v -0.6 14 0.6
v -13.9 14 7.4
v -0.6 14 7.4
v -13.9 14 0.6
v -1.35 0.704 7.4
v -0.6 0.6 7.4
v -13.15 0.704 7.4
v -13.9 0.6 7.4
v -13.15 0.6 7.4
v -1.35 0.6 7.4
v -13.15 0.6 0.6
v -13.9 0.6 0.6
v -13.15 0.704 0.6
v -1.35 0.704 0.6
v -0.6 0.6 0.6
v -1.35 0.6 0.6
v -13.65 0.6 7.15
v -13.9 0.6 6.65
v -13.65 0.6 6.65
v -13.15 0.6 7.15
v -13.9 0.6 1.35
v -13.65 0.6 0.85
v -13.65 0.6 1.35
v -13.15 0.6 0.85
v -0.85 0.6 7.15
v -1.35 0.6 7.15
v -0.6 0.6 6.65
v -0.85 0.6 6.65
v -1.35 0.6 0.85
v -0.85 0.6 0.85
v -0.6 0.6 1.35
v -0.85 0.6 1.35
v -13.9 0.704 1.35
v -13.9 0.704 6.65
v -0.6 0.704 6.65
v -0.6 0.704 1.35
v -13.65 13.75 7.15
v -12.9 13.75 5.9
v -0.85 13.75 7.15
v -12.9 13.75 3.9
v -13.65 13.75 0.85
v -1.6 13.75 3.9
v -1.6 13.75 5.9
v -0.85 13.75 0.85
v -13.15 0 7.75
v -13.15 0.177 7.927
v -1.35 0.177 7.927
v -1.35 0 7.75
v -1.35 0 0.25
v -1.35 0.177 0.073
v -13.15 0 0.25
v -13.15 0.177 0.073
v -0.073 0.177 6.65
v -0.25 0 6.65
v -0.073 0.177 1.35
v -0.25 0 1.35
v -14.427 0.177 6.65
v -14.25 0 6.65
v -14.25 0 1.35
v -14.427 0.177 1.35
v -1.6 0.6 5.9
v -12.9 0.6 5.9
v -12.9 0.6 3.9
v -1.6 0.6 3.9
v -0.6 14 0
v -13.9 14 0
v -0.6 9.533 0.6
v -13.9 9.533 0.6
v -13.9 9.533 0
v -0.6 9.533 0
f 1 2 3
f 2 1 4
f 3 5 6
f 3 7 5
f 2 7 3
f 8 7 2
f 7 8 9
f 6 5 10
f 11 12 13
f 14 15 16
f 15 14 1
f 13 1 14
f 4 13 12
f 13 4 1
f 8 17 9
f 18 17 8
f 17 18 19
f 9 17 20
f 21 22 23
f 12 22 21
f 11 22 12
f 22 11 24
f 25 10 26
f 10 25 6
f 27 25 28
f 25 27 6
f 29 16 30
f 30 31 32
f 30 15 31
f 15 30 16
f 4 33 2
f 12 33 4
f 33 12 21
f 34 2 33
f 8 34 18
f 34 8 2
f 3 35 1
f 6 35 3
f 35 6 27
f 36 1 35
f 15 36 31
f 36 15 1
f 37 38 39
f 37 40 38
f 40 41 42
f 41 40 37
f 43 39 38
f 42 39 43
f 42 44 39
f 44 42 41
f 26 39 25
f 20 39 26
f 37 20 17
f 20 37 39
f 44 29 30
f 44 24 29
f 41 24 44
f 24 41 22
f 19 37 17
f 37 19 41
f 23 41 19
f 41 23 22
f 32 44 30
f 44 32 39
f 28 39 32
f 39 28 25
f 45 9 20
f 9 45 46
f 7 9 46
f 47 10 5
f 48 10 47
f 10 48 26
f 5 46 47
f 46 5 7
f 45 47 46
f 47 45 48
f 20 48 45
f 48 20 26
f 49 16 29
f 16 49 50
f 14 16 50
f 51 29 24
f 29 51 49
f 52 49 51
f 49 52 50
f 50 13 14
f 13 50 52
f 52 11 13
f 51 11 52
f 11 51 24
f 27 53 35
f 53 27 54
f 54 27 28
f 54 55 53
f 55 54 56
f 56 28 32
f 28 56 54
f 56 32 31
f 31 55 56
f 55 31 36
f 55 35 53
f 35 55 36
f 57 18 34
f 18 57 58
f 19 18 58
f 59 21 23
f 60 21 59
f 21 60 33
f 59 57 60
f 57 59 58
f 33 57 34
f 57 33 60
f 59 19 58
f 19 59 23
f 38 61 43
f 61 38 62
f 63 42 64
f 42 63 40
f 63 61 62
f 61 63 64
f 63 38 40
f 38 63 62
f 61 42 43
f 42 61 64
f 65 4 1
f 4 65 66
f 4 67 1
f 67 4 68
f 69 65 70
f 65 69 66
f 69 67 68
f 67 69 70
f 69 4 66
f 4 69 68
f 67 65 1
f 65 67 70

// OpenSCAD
include <../../lib/device/component.scad>;

rotate([0,0,90]) usb();
